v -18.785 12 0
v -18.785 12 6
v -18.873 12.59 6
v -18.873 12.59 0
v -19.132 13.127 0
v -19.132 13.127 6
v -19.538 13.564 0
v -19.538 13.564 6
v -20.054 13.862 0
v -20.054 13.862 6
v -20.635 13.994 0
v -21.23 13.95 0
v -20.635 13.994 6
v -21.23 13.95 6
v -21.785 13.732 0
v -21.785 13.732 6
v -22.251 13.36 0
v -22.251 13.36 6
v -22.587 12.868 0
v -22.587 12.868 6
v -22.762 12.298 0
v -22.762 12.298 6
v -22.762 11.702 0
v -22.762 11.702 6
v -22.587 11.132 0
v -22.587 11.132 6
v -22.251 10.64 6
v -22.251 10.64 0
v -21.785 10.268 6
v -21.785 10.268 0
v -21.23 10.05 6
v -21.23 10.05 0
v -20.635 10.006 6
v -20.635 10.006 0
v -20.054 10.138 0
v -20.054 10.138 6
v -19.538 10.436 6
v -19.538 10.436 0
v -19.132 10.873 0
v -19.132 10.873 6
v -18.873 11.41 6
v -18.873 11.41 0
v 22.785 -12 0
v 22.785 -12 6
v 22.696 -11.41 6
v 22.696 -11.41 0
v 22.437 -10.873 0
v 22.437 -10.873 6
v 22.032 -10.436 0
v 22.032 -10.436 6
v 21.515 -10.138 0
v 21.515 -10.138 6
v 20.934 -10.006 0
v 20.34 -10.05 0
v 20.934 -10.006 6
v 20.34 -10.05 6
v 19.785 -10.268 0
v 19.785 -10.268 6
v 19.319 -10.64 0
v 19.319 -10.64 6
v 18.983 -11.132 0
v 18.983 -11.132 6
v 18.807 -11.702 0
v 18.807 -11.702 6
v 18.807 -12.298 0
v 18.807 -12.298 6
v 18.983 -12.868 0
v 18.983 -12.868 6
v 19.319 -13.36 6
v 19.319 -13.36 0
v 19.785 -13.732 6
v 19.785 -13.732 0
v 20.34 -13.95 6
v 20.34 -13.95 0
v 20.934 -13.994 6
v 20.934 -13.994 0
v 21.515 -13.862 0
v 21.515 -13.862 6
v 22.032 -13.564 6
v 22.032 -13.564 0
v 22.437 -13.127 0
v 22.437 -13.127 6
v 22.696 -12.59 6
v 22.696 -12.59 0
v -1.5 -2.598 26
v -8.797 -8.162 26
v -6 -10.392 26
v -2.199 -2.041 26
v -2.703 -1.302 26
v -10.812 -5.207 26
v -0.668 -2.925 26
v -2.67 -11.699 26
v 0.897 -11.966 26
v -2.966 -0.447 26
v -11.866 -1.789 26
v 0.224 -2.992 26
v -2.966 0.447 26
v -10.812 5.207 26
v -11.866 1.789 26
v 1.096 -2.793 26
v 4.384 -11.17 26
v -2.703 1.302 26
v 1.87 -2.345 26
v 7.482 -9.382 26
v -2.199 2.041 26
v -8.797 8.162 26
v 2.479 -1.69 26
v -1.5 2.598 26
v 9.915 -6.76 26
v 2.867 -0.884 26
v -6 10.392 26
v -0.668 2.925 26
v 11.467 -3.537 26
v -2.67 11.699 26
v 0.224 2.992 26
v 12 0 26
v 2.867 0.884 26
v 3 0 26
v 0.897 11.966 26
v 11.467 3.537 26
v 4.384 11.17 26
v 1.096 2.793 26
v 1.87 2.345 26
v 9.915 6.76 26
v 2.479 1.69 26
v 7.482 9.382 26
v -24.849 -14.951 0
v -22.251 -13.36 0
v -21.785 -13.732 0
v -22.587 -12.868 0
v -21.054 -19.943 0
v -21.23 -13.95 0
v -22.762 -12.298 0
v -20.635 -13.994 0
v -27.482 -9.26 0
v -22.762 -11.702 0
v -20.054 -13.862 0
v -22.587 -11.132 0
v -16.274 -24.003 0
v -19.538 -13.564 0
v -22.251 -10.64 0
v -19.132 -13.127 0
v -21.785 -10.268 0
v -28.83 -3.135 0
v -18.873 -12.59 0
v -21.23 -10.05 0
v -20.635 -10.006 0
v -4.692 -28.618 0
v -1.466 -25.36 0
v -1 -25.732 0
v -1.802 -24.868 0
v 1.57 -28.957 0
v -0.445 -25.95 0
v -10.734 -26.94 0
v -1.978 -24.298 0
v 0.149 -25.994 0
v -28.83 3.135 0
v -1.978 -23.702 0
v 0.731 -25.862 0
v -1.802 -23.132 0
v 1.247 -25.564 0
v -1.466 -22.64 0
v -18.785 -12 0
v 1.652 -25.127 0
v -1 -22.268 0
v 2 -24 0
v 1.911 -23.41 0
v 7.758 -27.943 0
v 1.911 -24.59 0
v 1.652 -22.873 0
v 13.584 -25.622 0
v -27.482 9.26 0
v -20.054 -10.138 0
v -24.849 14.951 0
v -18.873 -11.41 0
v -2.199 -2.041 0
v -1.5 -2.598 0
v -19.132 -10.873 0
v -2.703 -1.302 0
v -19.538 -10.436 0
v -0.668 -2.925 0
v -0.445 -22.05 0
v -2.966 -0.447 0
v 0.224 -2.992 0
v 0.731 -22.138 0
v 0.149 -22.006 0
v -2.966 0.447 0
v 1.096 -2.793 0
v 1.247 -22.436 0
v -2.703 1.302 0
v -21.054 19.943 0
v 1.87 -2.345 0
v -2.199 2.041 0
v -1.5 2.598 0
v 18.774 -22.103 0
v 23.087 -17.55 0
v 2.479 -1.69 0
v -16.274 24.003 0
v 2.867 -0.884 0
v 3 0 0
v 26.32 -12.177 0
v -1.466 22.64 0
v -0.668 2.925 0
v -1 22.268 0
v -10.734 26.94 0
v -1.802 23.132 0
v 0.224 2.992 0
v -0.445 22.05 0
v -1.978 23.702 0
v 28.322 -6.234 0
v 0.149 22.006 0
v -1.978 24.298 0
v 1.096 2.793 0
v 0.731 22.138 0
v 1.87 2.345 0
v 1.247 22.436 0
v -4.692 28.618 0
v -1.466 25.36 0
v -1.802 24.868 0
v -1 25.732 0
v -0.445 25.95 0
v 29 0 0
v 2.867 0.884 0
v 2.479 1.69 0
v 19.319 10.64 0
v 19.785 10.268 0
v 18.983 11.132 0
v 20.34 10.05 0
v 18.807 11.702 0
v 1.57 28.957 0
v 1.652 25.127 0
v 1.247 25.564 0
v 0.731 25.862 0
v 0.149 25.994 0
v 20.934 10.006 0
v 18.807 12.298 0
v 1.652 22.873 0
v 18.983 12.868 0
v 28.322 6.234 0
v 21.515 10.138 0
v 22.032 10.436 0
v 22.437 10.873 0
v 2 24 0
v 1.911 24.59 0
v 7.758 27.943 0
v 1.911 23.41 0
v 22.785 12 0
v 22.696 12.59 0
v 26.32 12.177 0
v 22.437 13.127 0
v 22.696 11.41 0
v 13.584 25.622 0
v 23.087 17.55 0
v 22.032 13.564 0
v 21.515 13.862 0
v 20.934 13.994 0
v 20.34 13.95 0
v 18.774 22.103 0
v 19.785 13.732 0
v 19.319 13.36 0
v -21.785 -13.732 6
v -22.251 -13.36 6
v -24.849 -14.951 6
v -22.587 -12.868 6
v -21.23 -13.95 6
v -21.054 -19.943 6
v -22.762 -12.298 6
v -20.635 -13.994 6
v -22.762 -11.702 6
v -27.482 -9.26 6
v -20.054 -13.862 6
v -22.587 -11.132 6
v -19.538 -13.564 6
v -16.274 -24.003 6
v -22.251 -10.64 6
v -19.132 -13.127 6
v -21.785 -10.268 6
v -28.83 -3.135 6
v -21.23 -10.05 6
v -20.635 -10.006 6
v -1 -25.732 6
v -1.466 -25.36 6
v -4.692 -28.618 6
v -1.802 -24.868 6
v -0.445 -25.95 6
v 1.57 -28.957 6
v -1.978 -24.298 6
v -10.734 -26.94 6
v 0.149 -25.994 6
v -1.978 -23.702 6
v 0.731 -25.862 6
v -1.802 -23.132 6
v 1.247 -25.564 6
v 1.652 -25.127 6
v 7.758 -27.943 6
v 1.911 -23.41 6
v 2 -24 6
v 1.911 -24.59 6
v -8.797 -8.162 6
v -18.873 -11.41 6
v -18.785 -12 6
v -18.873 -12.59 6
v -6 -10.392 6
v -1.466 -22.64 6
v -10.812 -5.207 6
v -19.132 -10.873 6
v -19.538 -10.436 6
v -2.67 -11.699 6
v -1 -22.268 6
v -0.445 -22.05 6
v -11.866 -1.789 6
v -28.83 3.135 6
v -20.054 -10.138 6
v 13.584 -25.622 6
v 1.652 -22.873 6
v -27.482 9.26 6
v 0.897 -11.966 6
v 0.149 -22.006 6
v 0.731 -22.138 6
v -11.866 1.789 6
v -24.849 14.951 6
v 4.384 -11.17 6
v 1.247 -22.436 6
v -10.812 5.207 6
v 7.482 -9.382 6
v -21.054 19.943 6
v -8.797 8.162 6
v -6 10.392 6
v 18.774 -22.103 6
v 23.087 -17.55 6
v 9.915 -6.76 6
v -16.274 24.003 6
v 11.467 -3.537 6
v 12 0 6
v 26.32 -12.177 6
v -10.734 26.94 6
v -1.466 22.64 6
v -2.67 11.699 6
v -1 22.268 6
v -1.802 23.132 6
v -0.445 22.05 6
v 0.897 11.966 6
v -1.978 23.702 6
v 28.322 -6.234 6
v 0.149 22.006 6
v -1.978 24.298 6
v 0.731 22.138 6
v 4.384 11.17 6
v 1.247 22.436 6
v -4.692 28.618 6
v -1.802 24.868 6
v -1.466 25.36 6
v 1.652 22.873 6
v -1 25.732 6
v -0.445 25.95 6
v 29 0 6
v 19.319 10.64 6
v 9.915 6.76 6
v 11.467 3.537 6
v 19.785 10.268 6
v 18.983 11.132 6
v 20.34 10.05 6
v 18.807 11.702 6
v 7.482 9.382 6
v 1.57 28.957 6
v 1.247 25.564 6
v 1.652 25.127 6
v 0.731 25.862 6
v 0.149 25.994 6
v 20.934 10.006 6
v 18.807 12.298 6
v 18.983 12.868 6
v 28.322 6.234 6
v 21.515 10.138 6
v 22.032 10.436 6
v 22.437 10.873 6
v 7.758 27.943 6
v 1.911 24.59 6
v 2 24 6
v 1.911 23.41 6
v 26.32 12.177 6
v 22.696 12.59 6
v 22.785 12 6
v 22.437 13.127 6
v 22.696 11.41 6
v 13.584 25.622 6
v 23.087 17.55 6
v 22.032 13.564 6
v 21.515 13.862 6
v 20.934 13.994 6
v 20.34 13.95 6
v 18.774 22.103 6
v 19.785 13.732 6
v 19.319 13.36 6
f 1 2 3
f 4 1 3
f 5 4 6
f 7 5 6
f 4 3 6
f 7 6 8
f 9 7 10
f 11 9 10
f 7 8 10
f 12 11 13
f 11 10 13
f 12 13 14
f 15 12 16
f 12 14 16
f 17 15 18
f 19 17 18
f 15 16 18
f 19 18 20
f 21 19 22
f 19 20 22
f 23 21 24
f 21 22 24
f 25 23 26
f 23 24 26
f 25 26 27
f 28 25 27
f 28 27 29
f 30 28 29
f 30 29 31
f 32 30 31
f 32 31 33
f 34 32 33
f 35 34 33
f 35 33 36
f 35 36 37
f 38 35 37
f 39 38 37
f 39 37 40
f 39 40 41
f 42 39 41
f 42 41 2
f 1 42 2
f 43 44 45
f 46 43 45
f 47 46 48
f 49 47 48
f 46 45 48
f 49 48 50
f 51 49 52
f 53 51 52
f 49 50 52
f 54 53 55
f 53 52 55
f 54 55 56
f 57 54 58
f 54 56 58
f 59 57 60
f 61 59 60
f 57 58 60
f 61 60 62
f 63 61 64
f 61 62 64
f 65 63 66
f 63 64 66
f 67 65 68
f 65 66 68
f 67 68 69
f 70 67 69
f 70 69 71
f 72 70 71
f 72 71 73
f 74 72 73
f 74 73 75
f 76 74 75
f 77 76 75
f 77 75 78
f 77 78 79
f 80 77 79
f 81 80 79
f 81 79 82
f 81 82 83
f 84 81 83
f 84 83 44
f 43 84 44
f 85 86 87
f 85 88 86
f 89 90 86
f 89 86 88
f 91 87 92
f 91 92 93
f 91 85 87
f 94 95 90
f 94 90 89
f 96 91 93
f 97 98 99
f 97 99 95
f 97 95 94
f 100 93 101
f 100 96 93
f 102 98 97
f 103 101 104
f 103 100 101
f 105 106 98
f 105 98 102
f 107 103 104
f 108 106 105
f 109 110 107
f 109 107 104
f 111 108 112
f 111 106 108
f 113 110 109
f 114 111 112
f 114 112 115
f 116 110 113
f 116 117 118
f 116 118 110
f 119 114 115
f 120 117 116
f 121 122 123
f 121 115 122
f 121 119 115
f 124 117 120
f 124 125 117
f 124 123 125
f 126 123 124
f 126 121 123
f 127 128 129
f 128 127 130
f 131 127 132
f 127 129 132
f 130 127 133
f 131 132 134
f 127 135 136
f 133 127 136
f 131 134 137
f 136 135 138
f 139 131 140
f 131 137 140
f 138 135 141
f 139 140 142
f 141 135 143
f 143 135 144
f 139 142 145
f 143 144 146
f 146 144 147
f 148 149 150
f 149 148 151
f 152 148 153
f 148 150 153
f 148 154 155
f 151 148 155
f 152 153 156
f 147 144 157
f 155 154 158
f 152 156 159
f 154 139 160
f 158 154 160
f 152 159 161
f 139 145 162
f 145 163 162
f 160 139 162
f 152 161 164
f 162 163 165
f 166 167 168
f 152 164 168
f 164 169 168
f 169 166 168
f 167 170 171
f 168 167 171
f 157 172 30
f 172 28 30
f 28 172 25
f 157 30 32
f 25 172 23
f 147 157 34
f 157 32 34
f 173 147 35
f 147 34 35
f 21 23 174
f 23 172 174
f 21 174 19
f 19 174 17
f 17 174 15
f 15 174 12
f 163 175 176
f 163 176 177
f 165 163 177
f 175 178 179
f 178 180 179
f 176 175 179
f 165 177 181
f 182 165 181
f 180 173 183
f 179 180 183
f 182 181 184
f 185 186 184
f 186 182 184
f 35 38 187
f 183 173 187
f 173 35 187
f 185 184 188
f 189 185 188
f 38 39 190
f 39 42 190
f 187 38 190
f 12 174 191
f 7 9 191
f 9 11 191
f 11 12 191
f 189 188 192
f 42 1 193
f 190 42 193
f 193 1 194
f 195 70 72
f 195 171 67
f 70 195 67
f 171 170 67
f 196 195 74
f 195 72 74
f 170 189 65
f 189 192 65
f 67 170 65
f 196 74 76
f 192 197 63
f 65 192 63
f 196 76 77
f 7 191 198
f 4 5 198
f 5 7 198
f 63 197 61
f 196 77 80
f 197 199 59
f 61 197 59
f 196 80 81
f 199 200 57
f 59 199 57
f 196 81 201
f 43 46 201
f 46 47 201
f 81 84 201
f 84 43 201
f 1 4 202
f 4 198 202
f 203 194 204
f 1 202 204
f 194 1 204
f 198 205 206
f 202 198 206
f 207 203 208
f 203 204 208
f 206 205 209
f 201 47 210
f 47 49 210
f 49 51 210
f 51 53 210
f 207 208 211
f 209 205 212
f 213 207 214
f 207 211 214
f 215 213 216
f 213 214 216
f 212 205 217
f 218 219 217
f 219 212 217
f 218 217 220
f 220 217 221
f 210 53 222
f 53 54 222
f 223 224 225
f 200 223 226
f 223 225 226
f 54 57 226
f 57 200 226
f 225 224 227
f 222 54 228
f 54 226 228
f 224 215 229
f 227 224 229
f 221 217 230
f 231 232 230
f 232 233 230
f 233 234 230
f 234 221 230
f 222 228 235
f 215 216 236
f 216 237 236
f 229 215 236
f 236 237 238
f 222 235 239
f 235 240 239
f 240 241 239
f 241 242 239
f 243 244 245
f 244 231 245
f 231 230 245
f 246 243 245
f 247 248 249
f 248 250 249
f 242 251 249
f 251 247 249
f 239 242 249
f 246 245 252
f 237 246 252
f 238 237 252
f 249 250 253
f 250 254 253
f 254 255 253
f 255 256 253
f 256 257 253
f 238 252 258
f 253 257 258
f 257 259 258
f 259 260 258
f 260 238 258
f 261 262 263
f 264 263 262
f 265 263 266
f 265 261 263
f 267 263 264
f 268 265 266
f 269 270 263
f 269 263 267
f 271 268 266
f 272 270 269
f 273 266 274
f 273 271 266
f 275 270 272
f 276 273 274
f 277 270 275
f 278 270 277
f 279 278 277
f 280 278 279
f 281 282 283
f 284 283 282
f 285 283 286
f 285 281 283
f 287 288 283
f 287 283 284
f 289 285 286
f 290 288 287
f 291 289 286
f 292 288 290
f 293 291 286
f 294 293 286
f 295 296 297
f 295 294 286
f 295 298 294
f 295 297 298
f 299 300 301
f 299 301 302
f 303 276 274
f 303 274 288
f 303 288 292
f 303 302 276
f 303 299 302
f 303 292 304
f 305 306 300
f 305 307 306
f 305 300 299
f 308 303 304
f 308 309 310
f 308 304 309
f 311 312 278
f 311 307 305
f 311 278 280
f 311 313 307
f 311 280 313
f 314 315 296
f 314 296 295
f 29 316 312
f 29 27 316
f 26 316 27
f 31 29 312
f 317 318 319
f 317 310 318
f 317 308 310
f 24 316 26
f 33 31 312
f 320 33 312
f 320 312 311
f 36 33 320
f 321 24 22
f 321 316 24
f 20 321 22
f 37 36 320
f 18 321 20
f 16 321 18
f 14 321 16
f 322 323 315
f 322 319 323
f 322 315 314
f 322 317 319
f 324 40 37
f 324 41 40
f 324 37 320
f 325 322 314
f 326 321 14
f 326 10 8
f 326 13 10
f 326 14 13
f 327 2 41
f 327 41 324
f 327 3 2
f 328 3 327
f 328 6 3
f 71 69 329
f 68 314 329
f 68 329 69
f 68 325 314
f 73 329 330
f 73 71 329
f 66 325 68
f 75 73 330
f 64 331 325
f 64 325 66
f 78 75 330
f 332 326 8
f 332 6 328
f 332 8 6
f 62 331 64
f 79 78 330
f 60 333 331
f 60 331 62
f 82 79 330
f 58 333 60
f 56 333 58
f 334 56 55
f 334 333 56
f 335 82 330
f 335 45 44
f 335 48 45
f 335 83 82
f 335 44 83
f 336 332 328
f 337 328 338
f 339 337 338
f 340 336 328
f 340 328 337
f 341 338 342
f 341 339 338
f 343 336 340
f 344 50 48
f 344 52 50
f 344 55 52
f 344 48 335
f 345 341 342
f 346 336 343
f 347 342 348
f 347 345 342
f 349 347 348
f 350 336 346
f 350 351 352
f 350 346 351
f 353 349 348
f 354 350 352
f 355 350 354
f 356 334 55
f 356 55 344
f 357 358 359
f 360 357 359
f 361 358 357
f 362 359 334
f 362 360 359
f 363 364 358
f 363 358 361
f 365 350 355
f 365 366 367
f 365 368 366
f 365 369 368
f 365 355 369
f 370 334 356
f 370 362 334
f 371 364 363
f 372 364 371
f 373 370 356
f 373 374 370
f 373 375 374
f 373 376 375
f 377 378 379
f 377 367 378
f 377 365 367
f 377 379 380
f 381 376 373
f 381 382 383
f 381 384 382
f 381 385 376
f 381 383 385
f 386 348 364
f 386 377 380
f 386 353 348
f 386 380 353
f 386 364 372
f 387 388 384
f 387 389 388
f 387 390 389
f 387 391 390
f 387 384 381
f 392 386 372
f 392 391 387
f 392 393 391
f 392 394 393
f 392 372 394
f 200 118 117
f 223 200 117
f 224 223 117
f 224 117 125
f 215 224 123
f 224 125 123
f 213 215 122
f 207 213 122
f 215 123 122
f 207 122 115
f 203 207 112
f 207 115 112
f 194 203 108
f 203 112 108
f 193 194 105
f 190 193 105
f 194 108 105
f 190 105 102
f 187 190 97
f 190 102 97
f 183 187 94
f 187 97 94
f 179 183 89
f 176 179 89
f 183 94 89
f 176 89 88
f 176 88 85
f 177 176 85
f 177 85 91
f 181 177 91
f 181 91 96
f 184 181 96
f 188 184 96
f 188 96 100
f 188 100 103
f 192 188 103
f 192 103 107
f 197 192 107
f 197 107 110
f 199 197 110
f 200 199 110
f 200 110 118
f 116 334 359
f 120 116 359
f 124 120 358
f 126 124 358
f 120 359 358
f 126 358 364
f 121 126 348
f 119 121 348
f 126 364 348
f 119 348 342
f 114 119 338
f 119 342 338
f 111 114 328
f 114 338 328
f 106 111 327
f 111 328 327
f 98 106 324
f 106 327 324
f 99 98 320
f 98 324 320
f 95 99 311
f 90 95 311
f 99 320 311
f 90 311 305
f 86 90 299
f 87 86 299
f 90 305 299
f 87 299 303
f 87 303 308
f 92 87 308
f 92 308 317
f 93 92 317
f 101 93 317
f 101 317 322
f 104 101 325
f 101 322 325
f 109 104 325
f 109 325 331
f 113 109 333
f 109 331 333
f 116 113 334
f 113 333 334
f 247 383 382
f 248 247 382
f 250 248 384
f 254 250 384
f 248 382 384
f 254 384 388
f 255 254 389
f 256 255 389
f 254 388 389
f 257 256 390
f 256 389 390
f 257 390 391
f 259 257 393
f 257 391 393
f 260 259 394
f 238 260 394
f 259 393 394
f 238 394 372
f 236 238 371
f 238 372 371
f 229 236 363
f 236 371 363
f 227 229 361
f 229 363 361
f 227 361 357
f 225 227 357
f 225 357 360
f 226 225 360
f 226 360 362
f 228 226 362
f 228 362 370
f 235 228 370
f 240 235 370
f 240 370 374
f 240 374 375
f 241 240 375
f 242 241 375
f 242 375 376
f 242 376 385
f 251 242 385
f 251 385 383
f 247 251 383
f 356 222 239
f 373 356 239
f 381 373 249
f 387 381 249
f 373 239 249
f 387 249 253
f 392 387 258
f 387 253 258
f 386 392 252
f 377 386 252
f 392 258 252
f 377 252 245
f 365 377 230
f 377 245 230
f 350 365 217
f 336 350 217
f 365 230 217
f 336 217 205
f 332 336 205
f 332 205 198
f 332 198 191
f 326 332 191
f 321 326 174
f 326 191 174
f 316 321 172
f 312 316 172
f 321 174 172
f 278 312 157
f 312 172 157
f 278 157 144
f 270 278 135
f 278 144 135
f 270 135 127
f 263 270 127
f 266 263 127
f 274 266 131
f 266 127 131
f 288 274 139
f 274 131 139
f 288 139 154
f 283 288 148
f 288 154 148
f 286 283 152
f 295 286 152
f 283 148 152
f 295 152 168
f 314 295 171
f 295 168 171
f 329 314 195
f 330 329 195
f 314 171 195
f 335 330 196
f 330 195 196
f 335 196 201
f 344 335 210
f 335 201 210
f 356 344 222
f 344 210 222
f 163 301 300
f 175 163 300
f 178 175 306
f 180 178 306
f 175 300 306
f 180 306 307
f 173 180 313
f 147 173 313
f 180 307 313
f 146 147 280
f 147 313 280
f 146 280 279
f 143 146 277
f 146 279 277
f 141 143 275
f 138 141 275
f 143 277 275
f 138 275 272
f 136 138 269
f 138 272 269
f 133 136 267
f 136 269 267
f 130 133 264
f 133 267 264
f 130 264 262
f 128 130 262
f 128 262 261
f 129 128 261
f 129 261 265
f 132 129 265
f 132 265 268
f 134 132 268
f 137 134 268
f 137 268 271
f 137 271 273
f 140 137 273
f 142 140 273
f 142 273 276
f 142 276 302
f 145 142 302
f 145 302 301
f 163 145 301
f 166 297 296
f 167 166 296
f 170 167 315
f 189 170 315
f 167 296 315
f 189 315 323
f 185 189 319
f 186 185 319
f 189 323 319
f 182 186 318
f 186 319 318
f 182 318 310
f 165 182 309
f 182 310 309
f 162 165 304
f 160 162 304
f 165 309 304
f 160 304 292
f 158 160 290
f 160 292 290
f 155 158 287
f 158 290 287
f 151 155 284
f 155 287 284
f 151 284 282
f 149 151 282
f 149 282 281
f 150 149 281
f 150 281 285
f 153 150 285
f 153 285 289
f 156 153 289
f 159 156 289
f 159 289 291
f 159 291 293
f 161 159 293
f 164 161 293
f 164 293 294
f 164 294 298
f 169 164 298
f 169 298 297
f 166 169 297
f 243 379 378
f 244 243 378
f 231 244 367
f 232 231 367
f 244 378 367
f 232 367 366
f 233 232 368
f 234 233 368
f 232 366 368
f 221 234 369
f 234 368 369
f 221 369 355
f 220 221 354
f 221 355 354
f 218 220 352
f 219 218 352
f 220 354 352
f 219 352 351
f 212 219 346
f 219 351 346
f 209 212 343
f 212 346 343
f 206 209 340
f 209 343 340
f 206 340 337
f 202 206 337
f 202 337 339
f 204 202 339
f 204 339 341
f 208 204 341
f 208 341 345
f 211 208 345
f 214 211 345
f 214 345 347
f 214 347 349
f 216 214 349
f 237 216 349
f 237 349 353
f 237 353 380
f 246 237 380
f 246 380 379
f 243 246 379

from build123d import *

# Parameters (mm, degrees)
SKETCH_1_R          = 29
EXTRUDE_1_DEPTH     = 6
SKETCH_2_R          = 12
EXTRUDE_2_DEPTH     = 20
SKETCH_3_R          = 2
CUT_EXTRUDE_1_DEPTH = 10
SKETCH_4_R          = 3
CUT_EXTRUDE_2_DEPTH = 30


with BuildPart() as part:
    # 草图1 → 凸台-拉伸1 (new body)
    with BuildSketch(Plane.XY):
        Circle(SKETCH_1_R)
    extrude(amount=EXTRUDE_1_DEPTH)

    # 草图2 → 凸台-拉伸2 (add)
    with BuildSketch(Plane.XY.offset(6)):
        Circle(SKETCH_2_R)
    extrude(amount=EXTRUDE_2_DEPTH)

    # 草图3 → 切除-拉伸1 (cut)
    with BuildSketch(Plane.XY.offset(6)):
        with Locations((0, 24)):
            Circle(SKETCH_3_R)
        with Locations((20.784609691, 12)):
            Circle(SKETCH_3_R)
        with Locations((20.784609691, -12)):
            Circle(SKETCH_3_R)
        with Locations((0, -24)):
            Circle(SKETCH_3_R)
        with Locations((-20.784609691, -12)):
            Circle(SKETCH_3_R)
        with Locations((-20.784609691, 12)):
            Circle(SKETCH_3_R)
    extrude(amount=-CUT_EXTRUDE_1_DEPTH, mode=Mode.SUBTRACT)

    # 草图4 → 切除-拉伸2 (cut)
    with BuildSketch(Plane.XY.offset(26)):
        Circle(SKETCH_4_R)
    extrude(amount=-CUT_EXTRUDE_2_DEPTH, mode=Mode.SUBTRACT)


solid = part.part
